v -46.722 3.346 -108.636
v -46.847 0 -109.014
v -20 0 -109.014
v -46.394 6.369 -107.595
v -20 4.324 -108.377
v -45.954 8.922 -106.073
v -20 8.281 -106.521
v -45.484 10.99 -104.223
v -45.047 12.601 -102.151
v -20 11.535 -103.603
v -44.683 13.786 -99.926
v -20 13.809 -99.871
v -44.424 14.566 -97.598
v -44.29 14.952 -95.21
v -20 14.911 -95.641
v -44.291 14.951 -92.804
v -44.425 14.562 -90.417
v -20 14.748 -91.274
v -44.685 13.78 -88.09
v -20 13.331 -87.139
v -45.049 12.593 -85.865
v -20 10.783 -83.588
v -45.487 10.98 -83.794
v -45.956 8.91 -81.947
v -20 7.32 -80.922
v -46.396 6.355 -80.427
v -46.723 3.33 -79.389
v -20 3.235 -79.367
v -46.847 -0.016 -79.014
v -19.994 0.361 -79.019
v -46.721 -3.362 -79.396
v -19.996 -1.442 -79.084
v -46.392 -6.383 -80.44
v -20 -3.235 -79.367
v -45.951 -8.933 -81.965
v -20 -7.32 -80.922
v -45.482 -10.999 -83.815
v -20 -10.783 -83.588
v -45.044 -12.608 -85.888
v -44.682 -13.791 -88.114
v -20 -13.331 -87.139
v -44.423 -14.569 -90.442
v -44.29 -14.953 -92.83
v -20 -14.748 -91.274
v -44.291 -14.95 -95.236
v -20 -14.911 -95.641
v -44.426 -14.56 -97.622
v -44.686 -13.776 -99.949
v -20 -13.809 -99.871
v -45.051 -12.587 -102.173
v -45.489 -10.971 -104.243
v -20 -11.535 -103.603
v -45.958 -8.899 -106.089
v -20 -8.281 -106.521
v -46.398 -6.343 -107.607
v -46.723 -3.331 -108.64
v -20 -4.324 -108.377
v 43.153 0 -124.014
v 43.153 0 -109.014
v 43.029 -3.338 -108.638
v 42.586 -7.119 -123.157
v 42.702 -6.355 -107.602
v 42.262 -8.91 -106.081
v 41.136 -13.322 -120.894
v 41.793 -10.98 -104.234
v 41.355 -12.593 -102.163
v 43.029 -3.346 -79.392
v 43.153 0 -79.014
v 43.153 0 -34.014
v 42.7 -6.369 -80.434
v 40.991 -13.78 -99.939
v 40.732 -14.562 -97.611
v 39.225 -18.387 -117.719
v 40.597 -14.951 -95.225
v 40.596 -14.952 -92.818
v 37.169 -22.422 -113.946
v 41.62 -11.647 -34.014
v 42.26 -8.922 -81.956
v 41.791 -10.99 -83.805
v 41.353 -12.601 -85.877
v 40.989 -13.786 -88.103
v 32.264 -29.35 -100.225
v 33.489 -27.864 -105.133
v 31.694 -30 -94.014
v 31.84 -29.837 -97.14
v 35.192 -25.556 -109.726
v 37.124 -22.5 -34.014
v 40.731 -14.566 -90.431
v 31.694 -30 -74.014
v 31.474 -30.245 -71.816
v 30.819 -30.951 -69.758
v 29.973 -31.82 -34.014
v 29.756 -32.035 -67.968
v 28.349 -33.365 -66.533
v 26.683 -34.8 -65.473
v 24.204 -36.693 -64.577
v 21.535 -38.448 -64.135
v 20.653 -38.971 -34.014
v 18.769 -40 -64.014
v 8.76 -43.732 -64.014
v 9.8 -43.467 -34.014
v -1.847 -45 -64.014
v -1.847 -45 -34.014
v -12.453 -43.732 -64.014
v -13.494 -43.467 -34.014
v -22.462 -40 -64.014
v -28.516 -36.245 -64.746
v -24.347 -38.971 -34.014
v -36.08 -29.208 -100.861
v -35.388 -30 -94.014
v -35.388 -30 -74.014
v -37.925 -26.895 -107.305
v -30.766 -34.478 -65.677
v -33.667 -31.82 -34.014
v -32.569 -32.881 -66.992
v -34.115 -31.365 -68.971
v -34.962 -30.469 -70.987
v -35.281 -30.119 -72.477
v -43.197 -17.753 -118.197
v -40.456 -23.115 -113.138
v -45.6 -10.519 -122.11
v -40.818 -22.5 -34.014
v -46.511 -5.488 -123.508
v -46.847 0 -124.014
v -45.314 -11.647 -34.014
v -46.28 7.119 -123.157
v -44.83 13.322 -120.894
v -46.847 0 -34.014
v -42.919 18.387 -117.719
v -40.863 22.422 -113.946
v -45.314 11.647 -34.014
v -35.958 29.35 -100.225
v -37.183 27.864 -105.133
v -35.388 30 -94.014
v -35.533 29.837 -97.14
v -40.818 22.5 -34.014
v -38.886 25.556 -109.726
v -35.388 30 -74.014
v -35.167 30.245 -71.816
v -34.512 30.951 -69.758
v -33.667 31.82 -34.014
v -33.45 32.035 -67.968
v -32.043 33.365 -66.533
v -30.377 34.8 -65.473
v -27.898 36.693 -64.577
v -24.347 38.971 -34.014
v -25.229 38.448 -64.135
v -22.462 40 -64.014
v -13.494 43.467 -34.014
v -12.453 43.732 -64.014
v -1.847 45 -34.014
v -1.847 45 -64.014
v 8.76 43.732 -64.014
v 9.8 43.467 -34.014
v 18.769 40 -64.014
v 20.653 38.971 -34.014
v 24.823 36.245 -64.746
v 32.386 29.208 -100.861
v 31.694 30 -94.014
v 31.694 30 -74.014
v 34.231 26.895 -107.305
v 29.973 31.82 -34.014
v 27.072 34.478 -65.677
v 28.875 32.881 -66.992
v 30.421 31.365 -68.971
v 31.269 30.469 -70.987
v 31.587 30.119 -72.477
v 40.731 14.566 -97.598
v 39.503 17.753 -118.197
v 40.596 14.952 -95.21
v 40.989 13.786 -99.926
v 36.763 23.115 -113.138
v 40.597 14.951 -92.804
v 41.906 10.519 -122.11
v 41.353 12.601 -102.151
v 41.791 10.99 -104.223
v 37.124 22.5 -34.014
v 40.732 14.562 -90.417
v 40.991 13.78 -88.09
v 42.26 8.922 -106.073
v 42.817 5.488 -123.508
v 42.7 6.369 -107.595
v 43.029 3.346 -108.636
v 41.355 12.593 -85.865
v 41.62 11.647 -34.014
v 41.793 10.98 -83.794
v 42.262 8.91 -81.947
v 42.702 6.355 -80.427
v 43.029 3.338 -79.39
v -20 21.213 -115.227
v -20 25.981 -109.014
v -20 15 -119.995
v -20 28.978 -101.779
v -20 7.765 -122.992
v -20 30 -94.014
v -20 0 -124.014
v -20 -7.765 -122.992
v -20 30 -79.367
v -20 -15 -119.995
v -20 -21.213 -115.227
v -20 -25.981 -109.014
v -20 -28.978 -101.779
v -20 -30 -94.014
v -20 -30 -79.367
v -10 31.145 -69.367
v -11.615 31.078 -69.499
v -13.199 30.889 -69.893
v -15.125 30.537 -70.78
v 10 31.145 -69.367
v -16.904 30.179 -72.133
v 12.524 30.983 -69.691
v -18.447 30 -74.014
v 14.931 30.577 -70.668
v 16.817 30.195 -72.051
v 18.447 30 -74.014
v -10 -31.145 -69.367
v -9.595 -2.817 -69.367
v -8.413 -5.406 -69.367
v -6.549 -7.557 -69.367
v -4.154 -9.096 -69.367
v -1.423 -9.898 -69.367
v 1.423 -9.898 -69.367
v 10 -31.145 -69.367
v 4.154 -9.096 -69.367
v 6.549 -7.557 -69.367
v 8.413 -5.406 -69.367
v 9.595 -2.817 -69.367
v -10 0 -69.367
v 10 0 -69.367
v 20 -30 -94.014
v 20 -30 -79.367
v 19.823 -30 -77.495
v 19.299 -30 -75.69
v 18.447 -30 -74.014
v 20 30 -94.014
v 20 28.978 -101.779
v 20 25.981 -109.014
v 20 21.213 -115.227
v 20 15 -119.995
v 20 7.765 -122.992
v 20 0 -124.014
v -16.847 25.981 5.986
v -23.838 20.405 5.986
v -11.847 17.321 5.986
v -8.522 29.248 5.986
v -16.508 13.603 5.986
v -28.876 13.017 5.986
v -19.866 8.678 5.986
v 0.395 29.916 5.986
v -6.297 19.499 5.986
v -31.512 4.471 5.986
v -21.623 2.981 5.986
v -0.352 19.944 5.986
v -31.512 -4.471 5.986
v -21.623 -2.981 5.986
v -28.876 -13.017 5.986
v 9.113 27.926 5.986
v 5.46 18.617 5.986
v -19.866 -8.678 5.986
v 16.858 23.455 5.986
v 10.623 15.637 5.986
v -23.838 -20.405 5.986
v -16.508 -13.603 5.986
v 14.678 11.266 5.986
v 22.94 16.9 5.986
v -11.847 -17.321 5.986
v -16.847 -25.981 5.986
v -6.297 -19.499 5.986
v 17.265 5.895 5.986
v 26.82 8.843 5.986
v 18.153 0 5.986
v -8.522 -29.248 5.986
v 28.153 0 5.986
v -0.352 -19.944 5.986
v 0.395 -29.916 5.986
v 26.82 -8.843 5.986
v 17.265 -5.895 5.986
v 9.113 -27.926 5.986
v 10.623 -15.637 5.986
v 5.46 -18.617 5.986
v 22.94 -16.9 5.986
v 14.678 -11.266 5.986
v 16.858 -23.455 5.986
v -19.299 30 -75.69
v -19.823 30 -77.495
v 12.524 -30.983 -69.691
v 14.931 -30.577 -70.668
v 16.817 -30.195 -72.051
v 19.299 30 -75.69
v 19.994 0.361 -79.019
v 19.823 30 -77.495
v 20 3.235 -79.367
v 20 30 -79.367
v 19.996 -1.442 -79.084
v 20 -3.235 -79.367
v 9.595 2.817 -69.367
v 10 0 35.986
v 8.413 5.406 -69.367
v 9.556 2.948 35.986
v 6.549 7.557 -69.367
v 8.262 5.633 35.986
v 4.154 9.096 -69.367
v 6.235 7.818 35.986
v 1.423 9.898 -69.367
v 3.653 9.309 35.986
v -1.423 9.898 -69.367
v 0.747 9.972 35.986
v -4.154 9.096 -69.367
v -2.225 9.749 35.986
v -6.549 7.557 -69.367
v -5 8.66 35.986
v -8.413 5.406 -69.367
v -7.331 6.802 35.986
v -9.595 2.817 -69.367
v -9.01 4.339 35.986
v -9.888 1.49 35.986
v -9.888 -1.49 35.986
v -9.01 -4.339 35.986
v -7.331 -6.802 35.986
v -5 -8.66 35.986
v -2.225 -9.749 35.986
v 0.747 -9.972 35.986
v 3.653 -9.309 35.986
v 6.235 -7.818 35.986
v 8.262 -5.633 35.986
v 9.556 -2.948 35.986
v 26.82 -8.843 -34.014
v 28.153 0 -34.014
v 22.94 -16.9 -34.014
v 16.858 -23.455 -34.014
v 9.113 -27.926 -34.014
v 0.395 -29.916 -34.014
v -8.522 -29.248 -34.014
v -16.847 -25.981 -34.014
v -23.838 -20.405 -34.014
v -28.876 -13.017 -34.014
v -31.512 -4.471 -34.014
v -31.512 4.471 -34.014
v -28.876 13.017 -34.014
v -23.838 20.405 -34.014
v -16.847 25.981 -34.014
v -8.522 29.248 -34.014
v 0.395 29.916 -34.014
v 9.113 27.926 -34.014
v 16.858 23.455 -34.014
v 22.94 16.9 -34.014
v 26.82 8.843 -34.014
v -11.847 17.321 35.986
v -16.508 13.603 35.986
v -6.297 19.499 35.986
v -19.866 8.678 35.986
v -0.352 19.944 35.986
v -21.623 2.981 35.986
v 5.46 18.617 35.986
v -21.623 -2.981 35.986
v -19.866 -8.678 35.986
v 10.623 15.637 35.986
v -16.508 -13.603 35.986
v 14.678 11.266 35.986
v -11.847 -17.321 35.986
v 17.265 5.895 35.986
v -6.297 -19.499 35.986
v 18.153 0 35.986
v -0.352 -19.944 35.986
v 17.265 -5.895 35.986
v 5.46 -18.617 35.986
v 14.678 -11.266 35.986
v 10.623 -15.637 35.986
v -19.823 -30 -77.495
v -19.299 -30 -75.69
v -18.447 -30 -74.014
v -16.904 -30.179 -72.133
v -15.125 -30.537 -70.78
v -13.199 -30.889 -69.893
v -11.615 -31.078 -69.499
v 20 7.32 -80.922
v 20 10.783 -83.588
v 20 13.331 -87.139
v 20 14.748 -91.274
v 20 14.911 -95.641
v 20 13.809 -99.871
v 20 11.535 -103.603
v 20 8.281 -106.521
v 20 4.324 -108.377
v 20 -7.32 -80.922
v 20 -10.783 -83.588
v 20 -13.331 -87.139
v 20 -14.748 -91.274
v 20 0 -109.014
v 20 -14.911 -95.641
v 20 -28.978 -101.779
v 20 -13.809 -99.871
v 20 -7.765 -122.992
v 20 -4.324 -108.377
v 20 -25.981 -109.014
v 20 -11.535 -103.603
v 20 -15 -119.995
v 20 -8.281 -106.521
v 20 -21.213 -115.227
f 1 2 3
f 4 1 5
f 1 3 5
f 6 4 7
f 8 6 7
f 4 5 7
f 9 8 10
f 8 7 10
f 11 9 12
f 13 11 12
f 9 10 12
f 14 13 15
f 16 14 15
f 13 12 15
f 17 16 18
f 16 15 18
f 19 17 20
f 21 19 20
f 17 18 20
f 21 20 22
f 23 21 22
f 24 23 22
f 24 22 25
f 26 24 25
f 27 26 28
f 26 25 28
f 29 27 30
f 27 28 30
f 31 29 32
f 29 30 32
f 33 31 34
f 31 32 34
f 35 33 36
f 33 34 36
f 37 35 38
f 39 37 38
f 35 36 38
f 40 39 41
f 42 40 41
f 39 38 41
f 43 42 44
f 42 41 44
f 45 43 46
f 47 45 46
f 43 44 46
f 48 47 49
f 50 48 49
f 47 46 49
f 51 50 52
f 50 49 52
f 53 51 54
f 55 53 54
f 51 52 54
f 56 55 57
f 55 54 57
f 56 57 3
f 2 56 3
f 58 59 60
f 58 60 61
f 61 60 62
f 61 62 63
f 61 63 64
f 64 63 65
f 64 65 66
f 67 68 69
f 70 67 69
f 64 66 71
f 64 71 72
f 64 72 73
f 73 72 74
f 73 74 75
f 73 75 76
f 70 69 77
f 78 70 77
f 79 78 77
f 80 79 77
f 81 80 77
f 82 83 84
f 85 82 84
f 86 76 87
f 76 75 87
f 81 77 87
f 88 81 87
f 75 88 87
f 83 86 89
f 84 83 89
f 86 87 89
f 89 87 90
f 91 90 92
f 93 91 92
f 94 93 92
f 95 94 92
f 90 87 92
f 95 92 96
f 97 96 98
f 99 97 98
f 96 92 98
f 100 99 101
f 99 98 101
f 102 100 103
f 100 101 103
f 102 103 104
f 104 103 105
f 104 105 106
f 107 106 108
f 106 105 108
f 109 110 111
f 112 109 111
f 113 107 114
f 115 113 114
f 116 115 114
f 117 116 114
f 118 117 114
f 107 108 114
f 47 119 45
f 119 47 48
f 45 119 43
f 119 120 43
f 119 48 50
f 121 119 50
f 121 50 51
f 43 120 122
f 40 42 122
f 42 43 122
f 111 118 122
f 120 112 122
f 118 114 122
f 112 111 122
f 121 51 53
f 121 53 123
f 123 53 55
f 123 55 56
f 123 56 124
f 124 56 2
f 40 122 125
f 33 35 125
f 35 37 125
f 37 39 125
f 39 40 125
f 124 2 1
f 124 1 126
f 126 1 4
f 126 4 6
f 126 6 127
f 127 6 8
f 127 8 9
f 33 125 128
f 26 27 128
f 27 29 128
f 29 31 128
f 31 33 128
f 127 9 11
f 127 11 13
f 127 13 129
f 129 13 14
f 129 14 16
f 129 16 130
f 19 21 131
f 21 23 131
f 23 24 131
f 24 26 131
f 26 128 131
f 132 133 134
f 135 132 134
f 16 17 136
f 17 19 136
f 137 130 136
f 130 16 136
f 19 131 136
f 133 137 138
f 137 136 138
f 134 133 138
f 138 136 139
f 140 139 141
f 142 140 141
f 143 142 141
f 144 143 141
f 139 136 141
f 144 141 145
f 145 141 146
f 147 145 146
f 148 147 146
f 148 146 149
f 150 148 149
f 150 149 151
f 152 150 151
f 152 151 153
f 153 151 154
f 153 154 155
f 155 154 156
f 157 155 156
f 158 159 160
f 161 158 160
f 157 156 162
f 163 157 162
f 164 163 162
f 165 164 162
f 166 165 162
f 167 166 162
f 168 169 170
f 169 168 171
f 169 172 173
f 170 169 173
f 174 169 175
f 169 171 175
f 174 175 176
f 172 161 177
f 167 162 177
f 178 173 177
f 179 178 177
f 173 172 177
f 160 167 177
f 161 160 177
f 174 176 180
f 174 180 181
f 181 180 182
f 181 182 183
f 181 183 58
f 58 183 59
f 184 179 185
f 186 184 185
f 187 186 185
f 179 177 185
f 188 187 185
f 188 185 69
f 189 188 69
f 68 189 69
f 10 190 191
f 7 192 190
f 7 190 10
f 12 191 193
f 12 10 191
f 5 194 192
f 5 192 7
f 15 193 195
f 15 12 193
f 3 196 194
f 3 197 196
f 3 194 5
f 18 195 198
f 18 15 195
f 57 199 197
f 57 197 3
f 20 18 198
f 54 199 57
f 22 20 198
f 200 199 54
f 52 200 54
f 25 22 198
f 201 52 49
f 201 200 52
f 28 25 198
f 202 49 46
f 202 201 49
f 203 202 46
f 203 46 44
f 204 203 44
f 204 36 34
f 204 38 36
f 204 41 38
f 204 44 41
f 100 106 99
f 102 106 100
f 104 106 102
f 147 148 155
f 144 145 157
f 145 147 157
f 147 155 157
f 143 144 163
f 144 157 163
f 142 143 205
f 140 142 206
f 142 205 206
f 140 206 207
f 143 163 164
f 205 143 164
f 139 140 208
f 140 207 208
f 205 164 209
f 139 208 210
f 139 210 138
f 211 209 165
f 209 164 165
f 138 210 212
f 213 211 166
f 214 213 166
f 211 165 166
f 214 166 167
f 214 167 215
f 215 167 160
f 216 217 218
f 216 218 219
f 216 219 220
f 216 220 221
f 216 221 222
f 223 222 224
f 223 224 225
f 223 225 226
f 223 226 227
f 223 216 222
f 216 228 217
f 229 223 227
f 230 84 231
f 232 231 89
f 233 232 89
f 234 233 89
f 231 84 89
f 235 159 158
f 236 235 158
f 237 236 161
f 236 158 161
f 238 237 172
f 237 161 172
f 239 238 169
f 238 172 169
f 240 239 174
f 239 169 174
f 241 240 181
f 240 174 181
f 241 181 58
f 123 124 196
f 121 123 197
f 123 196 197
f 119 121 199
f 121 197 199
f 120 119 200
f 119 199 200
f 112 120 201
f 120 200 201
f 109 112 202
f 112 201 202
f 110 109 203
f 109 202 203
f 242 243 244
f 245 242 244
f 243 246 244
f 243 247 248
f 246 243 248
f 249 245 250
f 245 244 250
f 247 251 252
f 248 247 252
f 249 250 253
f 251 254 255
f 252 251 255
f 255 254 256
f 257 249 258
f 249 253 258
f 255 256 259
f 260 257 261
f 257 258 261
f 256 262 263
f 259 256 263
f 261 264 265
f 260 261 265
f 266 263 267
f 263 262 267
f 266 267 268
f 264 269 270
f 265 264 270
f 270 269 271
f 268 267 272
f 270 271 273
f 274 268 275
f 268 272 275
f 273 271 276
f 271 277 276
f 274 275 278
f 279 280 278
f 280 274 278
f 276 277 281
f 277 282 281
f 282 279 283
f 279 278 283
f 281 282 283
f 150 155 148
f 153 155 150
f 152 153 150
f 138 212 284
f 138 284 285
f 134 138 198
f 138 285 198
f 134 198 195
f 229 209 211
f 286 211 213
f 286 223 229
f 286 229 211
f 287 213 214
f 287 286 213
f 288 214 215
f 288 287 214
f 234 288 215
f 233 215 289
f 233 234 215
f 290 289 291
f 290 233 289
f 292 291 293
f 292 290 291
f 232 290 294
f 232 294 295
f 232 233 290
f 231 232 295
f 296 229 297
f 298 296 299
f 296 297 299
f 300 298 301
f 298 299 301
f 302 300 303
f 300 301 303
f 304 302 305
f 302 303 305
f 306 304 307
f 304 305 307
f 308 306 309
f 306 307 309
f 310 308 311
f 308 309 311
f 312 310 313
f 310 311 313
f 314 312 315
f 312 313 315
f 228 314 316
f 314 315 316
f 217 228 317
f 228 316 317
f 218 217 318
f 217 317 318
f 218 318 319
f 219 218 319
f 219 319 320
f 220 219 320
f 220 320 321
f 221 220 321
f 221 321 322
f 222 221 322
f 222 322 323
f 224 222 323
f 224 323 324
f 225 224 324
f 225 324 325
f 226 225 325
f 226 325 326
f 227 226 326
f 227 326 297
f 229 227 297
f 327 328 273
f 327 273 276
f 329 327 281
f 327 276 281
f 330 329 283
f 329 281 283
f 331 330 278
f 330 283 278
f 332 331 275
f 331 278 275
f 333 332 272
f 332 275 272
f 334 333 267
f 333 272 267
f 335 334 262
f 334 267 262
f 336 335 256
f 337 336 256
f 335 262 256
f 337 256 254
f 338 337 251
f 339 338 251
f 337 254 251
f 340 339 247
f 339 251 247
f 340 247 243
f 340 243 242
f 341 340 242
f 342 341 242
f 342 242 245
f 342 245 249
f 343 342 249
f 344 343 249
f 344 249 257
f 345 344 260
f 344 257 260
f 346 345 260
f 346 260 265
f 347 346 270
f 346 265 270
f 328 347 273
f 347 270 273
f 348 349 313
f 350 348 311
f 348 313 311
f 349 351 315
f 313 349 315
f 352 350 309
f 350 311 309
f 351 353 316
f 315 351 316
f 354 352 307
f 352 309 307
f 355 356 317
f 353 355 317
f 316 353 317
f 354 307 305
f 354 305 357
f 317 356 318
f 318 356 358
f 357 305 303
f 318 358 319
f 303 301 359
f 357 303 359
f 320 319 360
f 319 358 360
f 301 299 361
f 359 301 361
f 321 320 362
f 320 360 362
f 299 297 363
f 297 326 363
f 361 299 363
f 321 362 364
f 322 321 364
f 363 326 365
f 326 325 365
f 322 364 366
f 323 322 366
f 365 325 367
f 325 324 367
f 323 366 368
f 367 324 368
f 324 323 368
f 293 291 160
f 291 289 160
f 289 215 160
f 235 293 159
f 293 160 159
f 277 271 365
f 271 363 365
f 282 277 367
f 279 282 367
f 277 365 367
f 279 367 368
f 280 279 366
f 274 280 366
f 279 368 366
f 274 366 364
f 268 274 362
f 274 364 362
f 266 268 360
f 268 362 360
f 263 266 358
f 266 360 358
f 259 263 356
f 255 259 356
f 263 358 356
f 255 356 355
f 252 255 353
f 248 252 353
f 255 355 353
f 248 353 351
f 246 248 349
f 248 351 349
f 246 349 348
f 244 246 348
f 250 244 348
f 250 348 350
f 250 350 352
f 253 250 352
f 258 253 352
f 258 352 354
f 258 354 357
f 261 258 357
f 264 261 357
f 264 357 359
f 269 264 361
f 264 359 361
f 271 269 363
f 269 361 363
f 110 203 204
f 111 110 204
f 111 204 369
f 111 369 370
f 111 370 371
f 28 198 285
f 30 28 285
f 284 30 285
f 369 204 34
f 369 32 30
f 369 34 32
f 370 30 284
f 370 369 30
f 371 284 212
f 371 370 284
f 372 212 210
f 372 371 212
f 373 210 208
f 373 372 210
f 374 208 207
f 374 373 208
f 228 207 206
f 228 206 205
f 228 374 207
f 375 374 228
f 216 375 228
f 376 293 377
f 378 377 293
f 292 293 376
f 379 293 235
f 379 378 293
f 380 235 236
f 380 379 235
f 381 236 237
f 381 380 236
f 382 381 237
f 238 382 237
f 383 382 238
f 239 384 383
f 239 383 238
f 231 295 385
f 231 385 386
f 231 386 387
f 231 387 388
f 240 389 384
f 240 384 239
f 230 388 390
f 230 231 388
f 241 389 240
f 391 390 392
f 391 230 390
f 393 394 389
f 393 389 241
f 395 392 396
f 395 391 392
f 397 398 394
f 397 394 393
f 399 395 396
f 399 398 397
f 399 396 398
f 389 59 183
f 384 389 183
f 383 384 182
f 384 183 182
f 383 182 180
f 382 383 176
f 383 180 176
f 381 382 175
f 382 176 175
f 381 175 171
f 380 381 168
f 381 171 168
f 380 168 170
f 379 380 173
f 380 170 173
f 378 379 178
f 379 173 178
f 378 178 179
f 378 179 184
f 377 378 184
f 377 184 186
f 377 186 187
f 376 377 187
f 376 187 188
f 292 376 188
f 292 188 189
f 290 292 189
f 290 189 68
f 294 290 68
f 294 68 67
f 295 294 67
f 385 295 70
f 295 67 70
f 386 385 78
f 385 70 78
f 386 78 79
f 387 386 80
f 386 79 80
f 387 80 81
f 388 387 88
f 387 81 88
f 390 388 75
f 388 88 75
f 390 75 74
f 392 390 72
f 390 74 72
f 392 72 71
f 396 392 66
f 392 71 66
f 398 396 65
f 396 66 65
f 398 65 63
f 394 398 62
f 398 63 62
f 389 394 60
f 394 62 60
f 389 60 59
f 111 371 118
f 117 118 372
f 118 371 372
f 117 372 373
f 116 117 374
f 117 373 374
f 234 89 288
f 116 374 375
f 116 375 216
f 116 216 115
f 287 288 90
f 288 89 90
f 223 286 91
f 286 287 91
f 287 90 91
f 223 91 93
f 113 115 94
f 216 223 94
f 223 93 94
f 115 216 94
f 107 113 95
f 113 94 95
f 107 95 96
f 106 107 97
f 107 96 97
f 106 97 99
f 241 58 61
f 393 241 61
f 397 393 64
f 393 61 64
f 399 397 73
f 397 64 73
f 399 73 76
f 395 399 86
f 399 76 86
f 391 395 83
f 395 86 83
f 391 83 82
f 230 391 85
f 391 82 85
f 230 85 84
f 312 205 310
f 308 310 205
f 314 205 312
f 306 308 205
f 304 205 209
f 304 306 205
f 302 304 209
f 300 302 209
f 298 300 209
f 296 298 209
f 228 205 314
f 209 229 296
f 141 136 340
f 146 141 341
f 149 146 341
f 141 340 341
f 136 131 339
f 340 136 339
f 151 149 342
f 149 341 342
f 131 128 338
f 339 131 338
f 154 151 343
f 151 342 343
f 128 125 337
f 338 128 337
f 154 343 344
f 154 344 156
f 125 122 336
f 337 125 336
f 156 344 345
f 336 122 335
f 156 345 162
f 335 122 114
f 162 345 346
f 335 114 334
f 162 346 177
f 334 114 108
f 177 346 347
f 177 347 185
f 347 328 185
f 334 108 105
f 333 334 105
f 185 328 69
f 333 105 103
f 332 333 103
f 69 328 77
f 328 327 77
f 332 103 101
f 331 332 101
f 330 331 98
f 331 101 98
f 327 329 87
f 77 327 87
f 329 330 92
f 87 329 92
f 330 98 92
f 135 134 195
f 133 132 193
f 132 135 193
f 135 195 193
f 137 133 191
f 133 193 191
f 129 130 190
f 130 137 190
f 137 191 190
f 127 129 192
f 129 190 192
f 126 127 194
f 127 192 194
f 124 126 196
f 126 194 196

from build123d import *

# Parameters (mm, degrees)
SKETCH2_R          = 10
CUT_EXTRUDE1_DEPTH = 216
CUT_EXTRUDE2_DEPTH = 108
CUT_EXTRUDE3_DEPTH = 108
SKETCH7_R          = 15
CUT_EXTRUDE4_DEPTH = 108


with BuildPart() as part:
    # Sketch1 → Revolve1 (revolve)
    with BuildSketch(Plane(origin=(0, 0, 0), x_dir=(1, 0, 0), z_dir=(0, 1, 0)), mode=Mode.PRIVATE) as revolve1_sk:
        Polygon((-1.846866082, -35.985748219), (-1.846866082, 124.014251781), (-46.846866082, 124.014251781), (-46.846866082, 34.014251781), (-31.846866082, 34.014251781), (-31.846866082, -5.985748219), (-21.846866082, -5.985748219), (-21.846866082, -35.985748219), align=None)
    revolve(revolve1_sk.sketch.rotate(Axis((-1.846866082, 0, 35.985748219), (0, 0, -1)), 180), axis=Axis((-1.846866082, 0, 35.985748219), (0, 0, -1)))

    # Sketch2 → Cut-Extrude1 (cut)
    with BuildSketch(Plane.XY.offset(35.985748219)):
        Circle(SKETCH2_R)
    extrude(amount=-CUT_EXTRUDE1_DEPTH, mode=Mode.SUBTRACT)

    # Sketch4 → Cut-Extrude2 (cut, symmetric)
    with BuildSketch(Plane(origin=(0, 0, 0), x_dir=(0, 0, -1), z_dir=(1, 0, 0))):
        with BuildLine():
            Line((124.014251781, 45), (64.014251781, 45))
            Line((64.014251781, 45), (64.014251781, 40))
            ThreePointArc((64.014251781, 40), (66.94318397, 32.928932188), (74.014251781, 30))
            Line((74.014251781, 30), (94.014251781, 30))
            ThreePointArc((94.014251781, 30), (115.227455222, 21.213203431), (124.014251781, -1.4e-08))
            Line((124.014251781, -1.4e-08), (124.014251781, 45))
        make_face()
        with BuildLine():
            Line((124.014251781, -45), (124.014251781, -1.4e-08))
            ThreePointArc((124.014251781, -1.4e-08), (115.227455212, -21.213203441), (94.014251781, -30))
            Line((94.014251781, -30), (74.014251781, -30))
            ThreePointArc((74.014251781, -30), (66.94318397, -32.928932188), (64.014251781, -40))
            Line((64.014251781, -40), (64.014251781, -45))
            Line((64.014251781, -45), (124.014251781, -45))
        make_face()
    extrude(amount=CUT_EXTRUDE2_DEPTH, both=True, mode=Mode.SUBTRACT)

    # Sketch5 → Cut-Extrude3 (cut, symmetric)
    with BuildSketch(Plane(origin=(0, -30, 0), x_dir=(-1, 0, 0), z_dir=(0, -1, 0))):
        with BuildLine():
            Line((-20, 129.367247505), (20, 129.367247505))
            Line((20, 129.367247505), (20, 79.367247505))
            ThreePointArc((20, 79.367247505), (17.071067812, 72.296179693), (10, 69.367247505))
            Line((10, 69.367247505), (-10, 69.367247505))
            ThreePointArc((-10, 69.367247505), (-17.071067812, 72.296179693), (-20, 79.367247505))
            Line((-20, 79.367247505), (-20, 129.367247505))
        make_face()
    extrude(amount=CUT_EXTRUDE3_DEPTH, both=True, mode=Mode.SUBTRACT)

    # Sketch7 → Cut-Extrude4 (cut, symmetric)
    with BuildSketch(Plane(origin=(0, 0, 0), x_dir=(0, 0, -1), z_dir=(1, 0, 0))):
        with Locations((94.014251781, 0)):
            Circle(SKETCH7_R)
    extrude(amount=CUT_EXTRUDE4_DEPTH, both=True, mode=Mode.SUBTRACT)


solid = part.part
